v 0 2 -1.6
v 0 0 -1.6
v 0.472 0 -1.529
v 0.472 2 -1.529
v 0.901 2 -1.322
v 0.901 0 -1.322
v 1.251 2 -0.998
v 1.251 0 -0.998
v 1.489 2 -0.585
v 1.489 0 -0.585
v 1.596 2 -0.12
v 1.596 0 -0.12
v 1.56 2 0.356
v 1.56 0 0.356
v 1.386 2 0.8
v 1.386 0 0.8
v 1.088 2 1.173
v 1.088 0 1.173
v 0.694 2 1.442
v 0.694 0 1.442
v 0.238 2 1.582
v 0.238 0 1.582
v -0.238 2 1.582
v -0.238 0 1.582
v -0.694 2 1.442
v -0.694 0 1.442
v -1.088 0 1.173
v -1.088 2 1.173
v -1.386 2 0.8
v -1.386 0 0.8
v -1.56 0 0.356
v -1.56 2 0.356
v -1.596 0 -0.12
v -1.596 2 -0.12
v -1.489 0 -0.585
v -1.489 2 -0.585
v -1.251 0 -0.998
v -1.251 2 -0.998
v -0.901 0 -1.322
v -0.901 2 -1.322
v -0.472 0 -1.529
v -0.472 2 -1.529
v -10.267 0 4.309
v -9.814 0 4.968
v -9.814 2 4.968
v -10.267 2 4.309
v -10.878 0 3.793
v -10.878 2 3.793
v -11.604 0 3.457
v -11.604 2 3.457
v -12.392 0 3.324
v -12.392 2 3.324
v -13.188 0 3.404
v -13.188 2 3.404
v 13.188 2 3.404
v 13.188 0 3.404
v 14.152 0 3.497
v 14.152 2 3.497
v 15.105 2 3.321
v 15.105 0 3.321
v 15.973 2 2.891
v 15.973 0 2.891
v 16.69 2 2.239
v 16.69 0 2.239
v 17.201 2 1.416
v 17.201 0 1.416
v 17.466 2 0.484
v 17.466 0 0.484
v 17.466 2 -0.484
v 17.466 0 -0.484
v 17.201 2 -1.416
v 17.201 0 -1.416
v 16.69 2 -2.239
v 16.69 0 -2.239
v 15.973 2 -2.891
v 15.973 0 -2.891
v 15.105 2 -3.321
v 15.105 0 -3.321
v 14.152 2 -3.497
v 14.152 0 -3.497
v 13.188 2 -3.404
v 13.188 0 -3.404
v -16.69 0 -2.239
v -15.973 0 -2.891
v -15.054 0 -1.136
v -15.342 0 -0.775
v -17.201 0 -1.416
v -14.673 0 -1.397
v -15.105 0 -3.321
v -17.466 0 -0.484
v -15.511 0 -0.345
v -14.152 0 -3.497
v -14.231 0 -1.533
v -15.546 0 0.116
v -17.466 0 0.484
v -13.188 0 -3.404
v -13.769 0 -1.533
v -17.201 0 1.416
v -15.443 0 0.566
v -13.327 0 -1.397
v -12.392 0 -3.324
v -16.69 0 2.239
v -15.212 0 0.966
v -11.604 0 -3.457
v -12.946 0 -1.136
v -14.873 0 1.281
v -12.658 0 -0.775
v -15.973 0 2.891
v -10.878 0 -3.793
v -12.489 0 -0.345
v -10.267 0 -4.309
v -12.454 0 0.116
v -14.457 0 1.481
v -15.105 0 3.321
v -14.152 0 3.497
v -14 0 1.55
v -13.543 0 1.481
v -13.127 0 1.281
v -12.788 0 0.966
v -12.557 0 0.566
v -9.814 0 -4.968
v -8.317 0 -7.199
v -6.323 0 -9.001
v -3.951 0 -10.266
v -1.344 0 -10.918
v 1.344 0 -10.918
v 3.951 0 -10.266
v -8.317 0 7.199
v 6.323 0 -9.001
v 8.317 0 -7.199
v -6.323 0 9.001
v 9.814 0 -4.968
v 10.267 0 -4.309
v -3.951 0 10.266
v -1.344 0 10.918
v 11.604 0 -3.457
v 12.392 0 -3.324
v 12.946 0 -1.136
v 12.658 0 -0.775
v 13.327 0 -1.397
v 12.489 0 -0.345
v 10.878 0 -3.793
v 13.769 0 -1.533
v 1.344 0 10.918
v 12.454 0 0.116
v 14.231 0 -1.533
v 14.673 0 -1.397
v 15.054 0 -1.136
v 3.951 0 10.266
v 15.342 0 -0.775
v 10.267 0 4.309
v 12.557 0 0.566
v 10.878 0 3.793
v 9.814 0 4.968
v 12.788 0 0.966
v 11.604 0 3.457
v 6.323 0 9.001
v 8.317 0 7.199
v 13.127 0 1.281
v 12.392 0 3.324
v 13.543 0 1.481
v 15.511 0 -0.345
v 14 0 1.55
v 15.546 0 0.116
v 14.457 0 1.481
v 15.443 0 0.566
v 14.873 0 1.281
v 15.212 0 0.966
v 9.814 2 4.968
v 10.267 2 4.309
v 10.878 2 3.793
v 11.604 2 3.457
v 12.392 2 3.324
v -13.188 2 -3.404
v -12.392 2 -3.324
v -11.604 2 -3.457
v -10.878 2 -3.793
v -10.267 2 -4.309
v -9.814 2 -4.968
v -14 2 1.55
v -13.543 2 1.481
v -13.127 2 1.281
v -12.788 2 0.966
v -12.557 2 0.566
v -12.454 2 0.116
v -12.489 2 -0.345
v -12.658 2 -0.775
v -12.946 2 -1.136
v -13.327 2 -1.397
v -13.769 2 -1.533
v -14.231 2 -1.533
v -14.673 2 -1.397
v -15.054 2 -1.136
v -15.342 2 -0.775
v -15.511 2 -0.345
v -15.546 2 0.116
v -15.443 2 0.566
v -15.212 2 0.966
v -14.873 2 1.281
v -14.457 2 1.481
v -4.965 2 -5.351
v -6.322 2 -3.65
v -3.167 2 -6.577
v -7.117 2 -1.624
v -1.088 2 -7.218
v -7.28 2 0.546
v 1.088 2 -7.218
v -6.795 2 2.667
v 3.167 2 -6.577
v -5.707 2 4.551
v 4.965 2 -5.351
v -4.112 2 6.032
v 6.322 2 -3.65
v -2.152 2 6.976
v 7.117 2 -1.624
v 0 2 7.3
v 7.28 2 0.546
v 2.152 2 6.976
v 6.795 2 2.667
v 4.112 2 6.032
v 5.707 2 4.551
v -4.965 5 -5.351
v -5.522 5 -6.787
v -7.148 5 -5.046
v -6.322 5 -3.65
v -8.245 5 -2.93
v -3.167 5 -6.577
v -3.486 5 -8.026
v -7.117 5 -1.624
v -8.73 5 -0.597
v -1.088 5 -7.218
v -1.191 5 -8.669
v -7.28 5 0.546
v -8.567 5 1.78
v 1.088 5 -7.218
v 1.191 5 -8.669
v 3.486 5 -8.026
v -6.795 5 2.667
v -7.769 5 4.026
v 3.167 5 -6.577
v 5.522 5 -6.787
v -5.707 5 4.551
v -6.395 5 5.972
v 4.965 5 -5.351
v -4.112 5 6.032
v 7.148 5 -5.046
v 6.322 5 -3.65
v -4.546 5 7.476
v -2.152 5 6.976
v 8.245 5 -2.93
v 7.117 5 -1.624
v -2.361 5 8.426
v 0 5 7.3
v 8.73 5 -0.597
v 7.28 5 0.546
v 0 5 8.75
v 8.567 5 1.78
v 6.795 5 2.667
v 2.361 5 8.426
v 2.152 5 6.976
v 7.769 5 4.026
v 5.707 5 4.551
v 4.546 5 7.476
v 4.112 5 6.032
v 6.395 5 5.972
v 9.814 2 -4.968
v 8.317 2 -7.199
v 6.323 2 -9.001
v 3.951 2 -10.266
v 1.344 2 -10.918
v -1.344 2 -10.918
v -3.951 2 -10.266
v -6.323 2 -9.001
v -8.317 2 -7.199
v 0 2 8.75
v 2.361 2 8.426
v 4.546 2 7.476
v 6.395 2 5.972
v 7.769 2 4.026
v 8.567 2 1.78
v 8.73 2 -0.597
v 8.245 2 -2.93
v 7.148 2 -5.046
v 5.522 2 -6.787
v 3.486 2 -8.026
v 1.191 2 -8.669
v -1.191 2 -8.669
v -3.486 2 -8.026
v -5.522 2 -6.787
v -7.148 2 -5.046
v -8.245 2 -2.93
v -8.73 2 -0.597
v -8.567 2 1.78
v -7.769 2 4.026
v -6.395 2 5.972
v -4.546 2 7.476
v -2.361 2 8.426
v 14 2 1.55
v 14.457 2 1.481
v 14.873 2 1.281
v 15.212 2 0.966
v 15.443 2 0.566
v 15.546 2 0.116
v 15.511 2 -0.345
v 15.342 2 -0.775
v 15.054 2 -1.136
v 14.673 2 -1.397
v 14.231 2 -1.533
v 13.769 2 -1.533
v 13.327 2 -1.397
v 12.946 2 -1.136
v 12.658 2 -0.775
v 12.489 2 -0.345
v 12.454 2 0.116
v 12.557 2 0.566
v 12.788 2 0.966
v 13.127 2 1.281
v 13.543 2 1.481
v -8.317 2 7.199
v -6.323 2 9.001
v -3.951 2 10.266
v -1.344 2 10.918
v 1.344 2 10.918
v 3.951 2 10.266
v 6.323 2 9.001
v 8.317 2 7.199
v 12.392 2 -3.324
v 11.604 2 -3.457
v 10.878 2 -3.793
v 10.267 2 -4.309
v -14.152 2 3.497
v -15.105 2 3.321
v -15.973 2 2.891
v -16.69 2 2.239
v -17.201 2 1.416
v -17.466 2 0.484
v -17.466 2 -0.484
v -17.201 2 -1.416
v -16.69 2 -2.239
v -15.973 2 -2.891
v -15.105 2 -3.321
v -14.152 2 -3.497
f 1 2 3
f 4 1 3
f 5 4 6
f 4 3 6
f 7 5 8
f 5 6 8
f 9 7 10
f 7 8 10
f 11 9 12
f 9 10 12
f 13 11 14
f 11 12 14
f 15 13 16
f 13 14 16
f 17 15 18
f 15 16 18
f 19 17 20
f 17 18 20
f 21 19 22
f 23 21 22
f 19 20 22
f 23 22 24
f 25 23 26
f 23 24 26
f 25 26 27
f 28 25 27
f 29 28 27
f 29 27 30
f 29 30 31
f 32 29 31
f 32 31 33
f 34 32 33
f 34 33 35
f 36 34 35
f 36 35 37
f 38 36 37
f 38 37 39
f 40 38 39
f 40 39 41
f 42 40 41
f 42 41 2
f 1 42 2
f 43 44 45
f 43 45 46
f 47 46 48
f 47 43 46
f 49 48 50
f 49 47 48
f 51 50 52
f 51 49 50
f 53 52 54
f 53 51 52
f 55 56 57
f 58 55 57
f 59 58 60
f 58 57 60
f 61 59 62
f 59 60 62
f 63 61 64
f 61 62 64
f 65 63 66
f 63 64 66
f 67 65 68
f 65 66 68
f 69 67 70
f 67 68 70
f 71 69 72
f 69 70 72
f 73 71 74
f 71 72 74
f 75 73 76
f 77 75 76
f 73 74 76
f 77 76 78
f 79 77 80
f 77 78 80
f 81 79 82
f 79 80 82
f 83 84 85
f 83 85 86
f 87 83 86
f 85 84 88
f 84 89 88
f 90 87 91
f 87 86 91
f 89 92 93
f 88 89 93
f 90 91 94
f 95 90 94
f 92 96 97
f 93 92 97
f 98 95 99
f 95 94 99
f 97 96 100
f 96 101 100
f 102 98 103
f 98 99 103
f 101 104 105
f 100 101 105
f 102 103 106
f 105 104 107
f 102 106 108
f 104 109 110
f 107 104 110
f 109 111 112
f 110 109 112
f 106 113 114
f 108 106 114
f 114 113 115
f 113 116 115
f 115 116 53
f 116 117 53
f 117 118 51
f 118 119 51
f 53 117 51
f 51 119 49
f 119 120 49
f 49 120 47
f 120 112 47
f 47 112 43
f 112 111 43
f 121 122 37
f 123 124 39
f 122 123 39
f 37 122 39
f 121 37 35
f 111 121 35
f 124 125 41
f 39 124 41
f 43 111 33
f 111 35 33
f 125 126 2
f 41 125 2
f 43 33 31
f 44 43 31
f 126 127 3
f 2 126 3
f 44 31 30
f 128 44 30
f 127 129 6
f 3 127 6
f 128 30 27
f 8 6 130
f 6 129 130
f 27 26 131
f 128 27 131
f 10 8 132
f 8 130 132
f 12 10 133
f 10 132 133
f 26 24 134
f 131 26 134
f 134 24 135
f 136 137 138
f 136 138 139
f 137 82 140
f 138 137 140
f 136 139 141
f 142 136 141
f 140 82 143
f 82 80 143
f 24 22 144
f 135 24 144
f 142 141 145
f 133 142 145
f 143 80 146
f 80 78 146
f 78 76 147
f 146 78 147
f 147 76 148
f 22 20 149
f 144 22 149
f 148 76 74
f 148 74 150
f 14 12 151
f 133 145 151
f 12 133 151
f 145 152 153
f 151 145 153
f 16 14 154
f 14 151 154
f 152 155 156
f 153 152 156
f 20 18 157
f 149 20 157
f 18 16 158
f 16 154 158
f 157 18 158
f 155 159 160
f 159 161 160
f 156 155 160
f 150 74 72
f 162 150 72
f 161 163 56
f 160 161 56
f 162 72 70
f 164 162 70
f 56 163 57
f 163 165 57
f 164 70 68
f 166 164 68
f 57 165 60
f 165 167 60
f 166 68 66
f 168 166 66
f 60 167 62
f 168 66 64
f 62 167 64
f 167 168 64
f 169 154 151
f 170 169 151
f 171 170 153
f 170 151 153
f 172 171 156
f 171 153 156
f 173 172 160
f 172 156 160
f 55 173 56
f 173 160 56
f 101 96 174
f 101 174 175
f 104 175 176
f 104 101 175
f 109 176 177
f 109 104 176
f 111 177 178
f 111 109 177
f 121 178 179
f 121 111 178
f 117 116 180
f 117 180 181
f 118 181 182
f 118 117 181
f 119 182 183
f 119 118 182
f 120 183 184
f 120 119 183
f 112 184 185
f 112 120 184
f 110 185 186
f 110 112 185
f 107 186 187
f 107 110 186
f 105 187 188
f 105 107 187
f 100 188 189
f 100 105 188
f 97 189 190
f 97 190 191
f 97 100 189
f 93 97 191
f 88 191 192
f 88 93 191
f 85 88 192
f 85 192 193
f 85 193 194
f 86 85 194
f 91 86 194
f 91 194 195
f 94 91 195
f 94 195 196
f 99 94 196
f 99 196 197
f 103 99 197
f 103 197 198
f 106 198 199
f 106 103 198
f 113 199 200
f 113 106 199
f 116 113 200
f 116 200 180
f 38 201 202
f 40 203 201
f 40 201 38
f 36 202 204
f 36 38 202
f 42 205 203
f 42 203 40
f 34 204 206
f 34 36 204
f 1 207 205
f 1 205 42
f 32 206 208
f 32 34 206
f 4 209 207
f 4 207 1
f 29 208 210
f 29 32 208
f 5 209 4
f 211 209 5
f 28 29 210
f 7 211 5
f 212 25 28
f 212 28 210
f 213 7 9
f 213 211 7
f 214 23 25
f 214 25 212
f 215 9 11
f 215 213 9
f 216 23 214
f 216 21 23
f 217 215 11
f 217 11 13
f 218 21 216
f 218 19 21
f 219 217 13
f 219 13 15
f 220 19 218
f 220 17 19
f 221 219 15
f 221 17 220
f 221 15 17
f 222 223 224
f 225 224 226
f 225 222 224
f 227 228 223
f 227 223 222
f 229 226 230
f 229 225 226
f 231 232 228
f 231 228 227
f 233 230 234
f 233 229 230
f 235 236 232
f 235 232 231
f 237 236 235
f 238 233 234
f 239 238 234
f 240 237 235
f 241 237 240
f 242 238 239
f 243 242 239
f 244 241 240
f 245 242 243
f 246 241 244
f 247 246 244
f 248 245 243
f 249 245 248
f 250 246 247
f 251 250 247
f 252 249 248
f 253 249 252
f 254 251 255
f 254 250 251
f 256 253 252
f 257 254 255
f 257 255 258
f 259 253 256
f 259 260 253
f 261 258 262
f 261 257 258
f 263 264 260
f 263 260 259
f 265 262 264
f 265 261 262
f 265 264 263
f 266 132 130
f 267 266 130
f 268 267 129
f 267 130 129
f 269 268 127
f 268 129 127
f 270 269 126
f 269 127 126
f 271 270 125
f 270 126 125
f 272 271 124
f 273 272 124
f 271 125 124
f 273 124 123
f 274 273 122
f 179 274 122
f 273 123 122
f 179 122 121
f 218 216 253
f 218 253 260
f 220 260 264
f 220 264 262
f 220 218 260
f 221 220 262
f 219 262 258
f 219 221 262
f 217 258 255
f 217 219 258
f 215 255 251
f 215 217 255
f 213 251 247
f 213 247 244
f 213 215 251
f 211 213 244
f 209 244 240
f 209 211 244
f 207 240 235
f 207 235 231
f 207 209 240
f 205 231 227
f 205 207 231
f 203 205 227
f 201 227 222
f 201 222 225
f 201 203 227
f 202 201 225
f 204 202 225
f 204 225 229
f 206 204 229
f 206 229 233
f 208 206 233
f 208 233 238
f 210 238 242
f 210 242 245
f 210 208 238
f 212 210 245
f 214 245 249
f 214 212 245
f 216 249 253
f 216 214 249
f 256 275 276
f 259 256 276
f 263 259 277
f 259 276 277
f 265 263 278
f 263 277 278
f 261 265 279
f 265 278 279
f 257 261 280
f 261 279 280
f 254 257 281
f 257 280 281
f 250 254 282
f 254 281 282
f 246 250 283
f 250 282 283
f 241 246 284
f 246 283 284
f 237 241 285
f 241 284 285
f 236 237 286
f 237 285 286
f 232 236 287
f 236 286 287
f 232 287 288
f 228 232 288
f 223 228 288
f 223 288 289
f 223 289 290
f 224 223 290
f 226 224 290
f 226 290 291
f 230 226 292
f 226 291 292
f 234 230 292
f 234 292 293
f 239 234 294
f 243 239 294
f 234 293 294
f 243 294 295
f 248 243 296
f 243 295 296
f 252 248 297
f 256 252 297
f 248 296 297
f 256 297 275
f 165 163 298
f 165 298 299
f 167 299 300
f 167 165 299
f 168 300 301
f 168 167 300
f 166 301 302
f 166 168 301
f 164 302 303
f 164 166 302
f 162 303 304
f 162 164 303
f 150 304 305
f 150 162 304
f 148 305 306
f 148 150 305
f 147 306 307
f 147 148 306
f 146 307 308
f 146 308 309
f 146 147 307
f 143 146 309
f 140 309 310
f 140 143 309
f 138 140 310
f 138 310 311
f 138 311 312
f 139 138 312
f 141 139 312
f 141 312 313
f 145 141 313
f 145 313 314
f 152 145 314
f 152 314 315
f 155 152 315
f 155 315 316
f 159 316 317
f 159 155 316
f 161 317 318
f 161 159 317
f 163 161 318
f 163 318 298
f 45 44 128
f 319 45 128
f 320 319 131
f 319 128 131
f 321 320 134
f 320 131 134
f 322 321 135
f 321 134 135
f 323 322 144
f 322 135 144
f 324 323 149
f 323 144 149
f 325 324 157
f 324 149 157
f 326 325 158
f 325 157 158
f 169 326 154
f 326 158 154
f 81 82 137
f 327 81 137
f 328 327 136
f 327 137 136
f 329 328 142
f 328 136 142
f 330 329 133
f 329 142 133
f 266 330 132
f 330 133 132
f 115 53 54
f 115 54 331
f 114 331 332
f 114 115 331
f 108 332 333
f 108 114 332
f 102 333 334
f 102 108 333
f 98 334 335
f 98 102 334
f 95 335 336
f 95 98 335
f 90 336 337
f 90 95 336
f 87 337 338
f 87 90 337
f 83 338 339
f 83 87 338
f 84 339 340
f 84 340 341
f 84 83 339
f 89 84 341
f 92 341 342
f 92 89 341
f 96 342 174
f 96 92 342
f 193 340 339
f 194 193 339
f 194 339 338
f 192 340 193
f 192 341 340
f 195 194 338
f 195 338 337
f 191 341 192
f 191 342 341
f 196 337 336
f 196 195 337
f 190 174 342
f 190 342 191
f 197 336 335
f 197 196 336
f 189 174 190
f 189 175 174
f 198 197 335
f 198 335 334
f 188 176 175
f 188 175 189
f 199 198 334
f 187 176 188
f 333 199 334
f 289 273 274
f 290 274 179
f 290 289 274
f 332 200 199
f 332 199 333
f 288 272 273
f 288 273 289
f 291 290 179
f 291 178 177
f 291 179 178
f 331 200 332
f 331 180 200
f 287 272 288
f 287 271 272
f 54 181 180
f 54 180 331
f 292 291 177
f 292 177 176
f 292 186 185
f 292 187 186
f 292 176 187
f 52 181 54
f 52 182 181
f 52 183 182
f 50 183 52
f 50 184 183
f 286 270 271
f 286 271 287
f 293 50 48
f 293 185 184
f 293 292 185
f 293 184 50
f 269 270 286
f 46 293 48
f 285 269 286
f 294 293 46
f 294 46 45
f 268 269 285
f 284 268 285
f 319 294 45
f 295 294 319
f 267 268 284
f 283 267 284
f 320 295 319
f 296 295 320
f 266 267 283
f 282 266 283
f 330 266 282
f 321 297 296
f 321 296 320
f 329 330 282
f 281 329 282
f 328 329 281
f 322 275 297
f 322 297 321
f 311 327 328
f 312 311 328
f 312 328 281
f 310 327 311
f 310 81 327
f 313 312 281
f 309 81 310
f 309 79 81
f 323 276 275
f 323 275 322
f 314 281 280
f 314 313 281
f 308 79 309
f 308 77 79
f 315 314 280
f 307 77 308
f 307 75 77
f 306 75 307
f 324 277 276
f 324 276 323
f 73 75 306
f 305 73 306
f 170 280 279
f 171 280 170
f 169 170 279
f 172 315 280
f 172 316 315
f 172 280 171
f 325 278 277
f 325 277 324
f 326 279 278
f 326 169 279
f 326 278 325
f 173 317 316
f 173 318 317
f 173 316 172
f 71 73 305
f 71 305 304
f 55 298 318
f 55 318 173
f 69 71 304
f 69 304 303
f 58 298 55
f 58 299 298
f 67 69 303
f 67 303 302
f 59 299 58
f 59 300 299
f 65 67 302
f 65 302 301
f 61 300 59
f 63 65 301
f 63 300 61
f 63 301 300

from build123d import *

# Parameters (mm, degrees)
SKETCH_1_R          = 11
EXTRUDE_1_DEPTH     = 2
EXTRUDE_START       = -2
SKETCH_3_R          = 1.55
EXTRUDE_2_DEPTH     = 2
CUT_EXTRUDE_1_REACH = 22.767
SKETCH_4_R          = 1.6
SKETCH_5_R          = 8.75
SKETCH_5_R_2        = 7.3
EXTRUDE_3_DEPTH     = 3


with BuildPart() as part:
    # 草图1 → 凸台-拉伸1 (new body)
    with BuildSketch(Plane(origin=(0, 0, 0), x_dir=(1, 0, 0), z_dir=(0, 1, 0))):
        with Locations(Location((0, 0, 0), (0, 0, 270))):
            Circle(SKETCH_1_R)
    extrude(amount=EXTRUDE_1_DEPTH)

    # 草图3 → 凸台-拉伸2 (add)
    # profile 1 of 2: a face of its own
    with BuildSketch(Plane(origin=(0, 2, 0), x_dir=(1, 0, 0), z_dir=(0, 1, 0)).offset(EXTRUDE_START)):
        with BuildLine():
            ThreePointArc((13.1875, 3.404385958), (11.2296215, 3.600530244), (9.814413265, 4.967624408))
            ThreePointArc((9.814413265, 4.967624408), (11, 0), (9.814413265, -4.967624408))
            ThreePointArc((9.814413265, -4.967624408), (11.2296215, -3.600530244), (13.1875, -3.404385958))
            ThreePointArc((13.1875, -3.404385958), (17.5, 0), (13.1875, 3.404385958))
        make_face()
        with Locations(Location((14, 0, 0), (0, 0, 270))):
            Circle(SKETCH_3_R, mode=Mode.SUBTRACT)
    # profile 2 of 2: a face of its own
    with BuildSketch(Plane(origin=(0, 2, 0), x_dir=(1, 0, 0), z_dir=(0, 1, 0)).offset(EXTRUDE_START)):
        with BuildLine():
            ThreePointArc((-9.814413265, 4.967624408), (-11, 0), (-9.814413265, -4.967624408))
            ThreePointArc((-9.814413265, -4.967624408), (-11.2296215, -3.600530244), (-13.1875, -3.404385958))
            ThreePointArc((-13.1875, -3.404385958), (-17.5, 0), (-13.1875, 3.404385958))
            ThreePointArc((-13.1875, 3.404385958), (-11.2296215, 3.600530244), (-9.814413265, 4.967624408))
        make_face()
        with Locations(Location((-14, 0, 0), (0, 0, 270))):
            Circle(SKETCH_3_R, mode=Mode.SUBTRACT)
    extrude(amount=EXTRUDE_2_DEPTH)

    # 草图4 → 切除-拉伸1 (cut, up to next)
    with BuildSketch(Plane.XZ, mode=Mode.PRIVATE) as cut_extrude_1_sk1:
        with Locations(Location((0, 0, 0), (0, 0, 270))):
            Circle(SKETCH_4_R)
    cut_extrude_1_tool1 = extrude(cut_extrude_1_sk1.sketch, amount=-CUT_EXTRUDE_1_REACH, mode=Mode.PRIVATE) & part.part
    add(cut_extrude_1_tool1.solids().sort_by_distance((0, 0, 0))[0], mode=Mode.SUBTRACT)

    # 草图5 → 凸台-拉伸3 (add)
    with BuildSketch(Plane(origin=(0, 2, 0), x_dir=(1, 0, 0), z_dir=(0, 1, 0))):
        with Locations(Location((0, 0, 0), (0, 0, 270))):
            Circle(SKETCH_5_R)
        with Locations(Location((0, 0, 0), (0, 0, 270))):
            Circle(SKETCH_5_R_2, mode=Mode.SUBTRACT)
    extrude(amount=EXTRUDE_3_DEPTH)


solid = part.part
